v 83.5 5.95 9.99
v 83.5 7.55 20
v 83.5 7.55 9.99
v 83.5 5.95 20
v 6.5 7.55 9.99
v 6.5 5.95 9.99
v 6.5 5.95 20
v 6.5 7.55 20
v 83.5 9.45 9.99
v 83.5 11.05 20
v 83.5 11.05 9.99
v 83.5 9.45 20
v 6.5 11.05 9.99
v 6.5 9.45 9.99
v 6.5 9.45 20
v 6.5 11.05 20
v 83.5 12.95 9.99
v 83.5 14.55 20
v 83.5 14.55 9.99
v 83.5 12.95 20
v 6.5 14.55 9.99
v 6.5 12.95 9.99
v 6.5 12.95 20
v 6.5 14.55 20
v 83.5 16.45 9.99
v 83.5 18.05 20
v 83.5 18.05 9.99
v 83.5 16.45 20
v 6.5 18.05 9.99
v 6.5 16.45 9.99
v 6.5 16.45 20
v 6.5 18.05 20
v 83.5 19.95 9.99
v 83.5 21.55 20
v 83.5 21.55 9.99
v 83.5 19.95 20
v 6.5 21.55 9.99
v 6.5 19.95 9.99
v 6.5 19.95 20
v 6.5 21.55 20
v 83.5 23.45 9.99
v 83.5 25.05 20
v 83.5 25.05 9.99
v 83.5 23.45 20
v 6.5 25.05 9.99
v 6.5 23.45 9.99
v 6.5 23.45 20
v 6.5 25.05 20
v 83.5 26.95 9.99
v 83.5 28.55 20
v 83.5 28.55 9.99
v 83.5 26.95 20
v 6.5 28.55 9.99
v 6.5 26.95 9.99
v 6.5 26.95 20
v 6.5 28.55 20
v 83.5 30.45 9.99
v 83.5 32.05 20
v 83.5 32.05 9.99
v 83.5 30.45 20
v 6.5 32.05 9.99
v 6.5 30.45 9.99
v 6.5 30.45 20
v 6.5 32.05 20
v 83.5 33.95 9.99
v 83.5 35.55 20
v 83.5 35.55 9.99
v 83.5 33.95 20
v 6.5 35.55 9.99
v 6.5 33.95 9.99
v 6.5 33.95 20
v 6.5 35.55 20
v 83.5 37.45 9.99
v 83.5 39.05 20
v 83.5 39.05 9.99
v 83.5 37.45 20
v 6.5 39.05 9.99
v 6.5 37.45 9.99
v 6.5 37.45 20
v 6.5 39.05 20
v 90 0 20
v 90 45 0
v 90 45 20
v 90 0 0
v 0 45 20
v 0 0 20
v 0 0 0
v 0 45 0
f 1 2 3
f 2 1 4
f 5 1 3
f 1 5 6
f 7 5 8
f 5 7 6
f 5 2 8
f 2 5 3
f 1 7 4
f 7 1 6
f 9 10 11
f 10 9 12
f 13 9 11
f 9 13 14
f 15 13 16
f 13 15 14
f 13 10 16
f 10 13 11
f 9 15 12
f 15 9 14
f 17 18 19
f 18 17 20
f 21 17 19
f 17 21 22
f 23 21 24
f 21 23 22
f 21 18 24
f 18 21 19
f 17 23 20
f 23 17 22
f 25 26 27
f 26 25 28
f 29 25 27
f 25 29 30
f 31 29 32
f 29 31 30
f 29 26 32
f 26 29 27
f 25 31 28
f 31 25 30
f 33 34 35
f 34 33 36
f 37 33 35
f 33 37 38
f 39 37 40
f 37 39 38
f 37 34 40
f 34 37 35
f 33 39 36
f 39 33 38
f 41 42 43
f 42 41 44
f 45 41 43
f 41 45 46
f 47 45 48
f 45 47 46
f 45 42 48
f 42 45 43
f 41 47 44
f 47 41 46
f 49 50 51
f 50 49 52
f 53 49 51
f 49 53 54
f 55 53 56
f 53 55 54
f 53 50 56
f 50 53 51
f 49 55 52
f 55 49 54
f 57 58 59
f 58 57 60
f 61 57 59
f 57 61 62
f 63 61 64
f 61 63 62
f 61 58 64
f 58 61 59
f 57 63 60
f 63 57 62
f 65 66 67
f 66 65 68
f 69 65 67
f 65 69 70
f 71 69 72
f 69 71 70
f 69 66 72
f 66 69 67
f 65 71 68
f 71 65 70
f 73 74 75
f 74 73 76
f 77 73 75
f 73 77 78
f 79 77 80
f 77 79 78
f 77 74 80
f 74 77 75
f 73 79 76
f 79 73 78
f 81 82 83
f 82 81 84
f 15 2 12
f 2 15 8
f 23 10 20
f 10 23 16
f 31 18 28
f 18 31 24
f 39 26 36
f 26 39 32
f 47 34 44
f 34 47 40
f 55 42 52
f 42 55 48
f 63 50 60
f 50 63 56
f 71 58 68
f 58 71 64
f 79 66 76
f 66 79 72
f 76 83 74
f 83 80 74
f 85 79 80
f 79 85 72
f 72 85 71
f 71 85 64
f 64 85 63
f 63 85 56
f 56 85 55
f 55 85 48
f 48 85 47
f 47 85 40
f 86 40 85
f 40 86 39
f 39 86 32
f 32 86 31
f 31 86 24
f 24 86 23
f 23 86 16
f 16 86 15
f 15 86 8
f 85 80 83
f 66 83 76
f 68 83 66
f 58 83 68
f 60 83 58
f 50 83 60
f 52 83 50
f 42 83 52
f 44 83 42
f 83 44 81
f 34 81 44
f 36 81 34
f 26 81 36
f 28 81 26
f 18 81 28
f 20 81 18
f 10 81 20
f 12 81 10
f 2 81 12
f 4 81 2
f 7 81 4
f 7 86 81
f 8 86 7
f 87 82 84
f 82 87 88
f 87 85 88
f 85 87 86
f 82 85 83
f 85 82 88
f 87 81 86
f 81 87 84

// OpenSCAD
// Dimensions for the microscope slide drying rack
base_x = 90;           // Length of the base block (X)
base_y = 45;           // Width of the base block (Y)
base_z = 20;           // Height of the base block (Z)
slot_x = 77;           // Length of each slot (X)
slot_y = 1.6;          // Width of each slot (Y)
slot_z = 10;           // Depth of each slot (Z)
slot_pitch = 3.5;      // Center-to-center distance between slots (Y)
num_slots = 10;        // Total number of slots

// Calculated offsets to ensure the group of slots is centered on the block
// The total width of the slot group from outer edge to outer edge is:
// (number_of_slots - 1) * pitch + slot_width
y_start = (base_y - ((num_slots - 1) * slot_pitch + slot_y)) / 2;
x_start = (base_x - slot_x) / 2;

difference() {
    // The main solid base block
    cube([base_x, base_y, base_z]);

    // The 10 parallel slots
    for (i = [0 : num_slots - 1]) {
        // We translate the slot to its position.
        // To ensure a clean cut through the top face, we extend the Z-height slightly.
        // To ensure a clean cut through the bottom of the slot, we start slightly below the target depth.
        translate([x_start, y_start + (i * slot_pitch), base_z - slot_z - 0.01]) {
            cube([slot_x, slot_y, slot_z + 0.02]);
        }
    }
}
